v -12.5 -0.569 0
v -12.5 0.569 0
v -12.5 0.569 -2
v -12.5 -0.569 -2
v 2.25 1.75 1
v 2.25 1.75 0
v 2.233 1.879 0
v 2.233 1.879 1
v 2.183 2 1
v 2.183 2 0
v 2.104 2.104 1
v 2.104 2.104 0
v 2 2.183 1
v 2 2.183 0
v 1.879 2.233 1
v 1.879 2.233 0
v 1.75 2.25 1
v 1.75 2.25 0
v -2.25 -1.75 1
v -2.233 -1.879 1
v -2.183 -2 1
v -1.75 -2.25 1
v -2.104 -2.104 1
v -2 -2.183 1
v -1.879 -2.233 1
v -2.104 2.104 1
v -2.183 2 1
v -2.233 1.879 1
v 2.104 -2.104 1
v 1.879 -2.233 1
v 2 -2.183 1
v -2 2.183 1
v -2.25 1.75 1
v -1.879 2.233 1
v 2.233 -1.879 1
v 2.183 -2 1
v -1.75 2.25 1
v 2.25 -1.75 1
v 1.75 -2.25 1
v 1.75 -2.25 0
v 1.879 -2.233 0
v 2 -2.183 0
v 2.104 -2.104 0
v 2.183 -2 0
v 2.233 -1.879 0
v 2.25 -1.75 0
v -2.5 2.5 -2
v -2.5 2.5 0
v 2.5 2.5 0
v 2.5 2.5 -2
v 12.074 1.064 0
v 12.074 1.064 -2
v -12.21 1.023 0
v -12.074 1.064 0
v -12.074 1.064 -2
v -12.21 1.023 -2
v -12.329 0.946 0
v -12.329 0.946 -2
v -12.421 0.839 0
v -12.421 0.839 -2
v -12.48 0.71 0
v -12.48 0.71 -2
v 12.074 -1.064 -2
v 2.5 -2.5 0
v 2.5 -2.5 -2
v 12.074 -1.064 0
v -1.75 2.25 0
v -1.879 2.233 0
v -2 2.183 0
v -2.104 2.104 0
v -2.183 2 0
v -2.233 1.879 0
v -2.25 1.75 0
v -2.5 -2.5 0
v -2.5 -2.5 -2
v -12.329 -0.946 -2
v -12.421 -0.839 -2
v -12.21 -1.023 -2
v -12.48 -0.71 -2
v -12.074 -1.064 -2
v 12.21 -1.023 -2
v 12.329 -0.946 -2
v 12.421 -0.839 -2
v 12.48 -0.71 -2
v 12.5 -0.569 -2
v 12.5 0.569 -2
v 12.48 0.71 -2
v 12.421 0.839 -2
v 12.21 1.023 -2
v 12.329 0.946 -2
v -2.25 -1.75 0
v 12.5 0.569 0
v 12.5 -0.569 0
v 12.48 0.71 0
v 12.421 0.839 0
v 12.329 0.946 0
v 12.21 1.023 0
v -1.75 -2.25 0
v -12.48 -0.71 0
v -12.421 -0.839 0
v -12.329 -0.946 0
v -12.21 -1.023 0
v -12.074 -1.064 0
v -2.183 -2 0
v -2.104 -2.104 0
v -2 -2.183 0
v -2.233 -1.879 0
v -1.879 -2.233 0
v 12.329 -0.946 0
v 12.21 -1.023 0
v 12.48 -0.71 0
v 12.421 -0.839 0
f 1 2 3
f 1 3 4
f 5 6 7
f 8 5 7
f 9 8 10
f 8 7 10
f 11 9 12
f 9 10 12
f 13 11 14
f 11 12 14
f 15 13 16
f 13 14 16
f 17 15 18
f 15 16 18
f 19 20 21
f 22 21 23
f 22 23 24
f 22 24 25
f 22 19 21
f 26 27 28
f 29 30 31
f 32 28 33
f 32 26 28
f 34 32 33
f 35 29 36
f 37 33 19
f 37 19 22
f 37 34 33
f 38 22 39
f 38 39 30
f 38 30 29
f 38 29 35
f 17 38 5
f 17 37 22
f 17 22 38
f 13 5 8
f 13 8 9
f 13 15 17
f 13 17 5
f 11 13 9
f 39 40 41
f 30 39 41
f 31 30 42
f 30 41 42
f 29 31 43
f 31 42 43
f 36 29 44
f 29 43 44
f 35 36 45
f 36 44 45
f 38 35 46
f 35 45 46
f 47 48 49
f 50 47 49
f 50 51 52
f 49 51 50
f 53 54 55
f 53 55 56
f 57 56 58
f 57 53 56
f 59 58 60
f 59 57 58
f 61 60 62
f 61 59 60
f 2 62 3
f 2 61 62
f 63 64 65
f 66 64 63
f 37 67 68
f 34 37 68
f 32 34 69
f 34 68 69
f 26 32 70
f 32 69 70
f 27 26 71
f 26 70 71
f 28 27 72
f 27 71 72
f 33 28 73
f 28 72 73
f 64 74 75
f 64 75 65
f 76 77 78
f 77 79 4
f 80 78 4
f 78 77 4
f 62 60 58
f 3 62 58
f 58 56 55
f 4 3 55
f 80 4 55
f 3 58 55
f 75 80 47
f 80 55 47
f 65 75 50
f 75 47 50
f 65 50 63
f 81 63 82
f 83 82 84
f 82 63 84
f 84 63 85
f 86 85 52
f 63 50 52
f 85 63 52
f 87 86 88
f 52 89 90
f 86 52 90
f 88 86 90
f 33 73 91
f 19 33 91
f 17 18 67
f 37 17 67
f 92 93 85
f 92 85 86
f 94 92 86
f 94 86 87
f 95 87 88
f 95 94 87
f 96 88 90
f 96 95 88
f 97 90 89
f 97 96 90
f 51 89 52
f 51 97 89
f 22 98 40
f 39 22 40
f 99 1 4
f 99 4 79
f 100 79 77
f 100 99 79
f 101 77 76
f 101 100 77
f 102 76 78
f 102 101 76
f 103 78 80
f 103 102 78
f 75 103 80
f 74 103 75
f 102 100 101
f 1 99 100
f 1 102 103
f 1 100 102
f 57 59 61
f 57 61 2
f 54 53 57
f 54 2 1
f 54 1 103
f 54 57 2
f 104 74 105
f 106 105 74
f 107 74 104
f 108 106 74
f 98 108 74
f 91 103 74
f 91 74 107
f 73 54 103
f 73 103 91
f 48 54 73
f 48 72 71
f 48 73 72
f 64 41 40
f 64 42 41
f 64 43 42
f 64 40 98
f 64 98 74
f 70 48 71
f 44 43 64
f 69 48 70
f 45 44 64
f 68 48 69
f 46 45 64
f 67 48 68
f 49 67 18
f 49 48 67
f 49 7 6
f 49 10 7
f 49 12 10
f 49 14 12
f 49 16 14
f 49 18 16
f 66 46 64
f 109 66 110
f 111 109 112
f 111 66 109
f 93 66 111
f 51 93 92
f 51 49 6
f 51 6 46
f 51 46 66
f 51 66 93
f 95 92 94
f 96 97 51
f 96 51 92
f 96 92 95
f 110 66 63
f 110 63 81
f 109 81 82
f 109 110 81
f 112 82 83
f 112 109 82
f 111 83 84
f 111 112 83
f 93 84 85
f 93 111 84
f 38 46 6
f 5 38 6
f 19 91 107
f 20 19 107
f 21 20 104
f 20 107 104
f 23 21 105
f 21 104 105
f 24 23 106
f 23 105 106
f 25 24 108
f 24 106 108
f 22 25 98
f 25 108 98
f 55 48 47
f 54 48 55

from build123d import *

# Parameters (mm, degrees)
F1_DEPTH = 1
F2_W     = 5
F2_H     = 5
F3_DEPTH = 2


with BuildPart() as f1:
    # F0 (on Top) → F1 (new body)
    with BuildSketch(Plane.XY):
        with BuildLine():
            Line((1.75, 2.25), (-1.75, 2.25))
            ThreePointArc((-1.75, 2.25), (-2.103553, 2.103553), (-2.25, 1.75))
            Line((-2.25, 1.75), (-2.25, -1.75))
            ThreePointArc((-2.25, -1.75), (-2.103553, -2.103553), (-1.75, -2.25))
            Line((-1.75, -2.25), (1.75, -2.25))
            ThreePointArc((1.75, -2.25), (2.103553, -2.103553), (2.25, -1.75))
            Line((2.25, -1.75), (2.25, 1.75))
            ThreePointArc((2.25, 1.75), (2.103553, 2.103553), (1.75, 2.25))
        make_face()
    extrude(amount=F1_DEPTH)

    # F2 (on Top) → F3 (join)
    with BuildSketch(Plane.XY):
        Rectangle(F2_W, F2_H)
        with BuildLine():
            Line((-12.07417, -1.063874), (-2.5, -2.5))
            Line((-2.5, -2.5), (-2.5, 2.5))
            Line((-2.5, 2.5), (-12.07417, 1.063874))
            ThreePointArc((-12.07417, 1.063874), (-12.37887, 0.895684), (-12.5, 0.569406))
            Line((-12.5, 0.569406), (-12.5, -0.569406))
            ThreePointArc((-12.5, -0.569406), (-12.37887, -0.895684), (-12.07417, -1.063874))
        make_face()
        with BuildLine():
            Line((2.5, 2.5), (2.5, -2.5))
            Line((2.5, -2.5), (12.07417, -1.063874))
            ThreePointArc((12.07417, -1.063874), (12.37887, -0.895684), (12.5, -0.569406))
            Line((12.5, -0.569406), (12.5, 0.569406))
            ThreePointArc((12.5, 0.569406), (12.37887, 0.895684), (12.07417, 1.063874))
            Line((12.07417, 1.063874), (2.5, 2.5))
        make_face()
    extrude(amount=-F3_DEPTH)


solid = f1.part
